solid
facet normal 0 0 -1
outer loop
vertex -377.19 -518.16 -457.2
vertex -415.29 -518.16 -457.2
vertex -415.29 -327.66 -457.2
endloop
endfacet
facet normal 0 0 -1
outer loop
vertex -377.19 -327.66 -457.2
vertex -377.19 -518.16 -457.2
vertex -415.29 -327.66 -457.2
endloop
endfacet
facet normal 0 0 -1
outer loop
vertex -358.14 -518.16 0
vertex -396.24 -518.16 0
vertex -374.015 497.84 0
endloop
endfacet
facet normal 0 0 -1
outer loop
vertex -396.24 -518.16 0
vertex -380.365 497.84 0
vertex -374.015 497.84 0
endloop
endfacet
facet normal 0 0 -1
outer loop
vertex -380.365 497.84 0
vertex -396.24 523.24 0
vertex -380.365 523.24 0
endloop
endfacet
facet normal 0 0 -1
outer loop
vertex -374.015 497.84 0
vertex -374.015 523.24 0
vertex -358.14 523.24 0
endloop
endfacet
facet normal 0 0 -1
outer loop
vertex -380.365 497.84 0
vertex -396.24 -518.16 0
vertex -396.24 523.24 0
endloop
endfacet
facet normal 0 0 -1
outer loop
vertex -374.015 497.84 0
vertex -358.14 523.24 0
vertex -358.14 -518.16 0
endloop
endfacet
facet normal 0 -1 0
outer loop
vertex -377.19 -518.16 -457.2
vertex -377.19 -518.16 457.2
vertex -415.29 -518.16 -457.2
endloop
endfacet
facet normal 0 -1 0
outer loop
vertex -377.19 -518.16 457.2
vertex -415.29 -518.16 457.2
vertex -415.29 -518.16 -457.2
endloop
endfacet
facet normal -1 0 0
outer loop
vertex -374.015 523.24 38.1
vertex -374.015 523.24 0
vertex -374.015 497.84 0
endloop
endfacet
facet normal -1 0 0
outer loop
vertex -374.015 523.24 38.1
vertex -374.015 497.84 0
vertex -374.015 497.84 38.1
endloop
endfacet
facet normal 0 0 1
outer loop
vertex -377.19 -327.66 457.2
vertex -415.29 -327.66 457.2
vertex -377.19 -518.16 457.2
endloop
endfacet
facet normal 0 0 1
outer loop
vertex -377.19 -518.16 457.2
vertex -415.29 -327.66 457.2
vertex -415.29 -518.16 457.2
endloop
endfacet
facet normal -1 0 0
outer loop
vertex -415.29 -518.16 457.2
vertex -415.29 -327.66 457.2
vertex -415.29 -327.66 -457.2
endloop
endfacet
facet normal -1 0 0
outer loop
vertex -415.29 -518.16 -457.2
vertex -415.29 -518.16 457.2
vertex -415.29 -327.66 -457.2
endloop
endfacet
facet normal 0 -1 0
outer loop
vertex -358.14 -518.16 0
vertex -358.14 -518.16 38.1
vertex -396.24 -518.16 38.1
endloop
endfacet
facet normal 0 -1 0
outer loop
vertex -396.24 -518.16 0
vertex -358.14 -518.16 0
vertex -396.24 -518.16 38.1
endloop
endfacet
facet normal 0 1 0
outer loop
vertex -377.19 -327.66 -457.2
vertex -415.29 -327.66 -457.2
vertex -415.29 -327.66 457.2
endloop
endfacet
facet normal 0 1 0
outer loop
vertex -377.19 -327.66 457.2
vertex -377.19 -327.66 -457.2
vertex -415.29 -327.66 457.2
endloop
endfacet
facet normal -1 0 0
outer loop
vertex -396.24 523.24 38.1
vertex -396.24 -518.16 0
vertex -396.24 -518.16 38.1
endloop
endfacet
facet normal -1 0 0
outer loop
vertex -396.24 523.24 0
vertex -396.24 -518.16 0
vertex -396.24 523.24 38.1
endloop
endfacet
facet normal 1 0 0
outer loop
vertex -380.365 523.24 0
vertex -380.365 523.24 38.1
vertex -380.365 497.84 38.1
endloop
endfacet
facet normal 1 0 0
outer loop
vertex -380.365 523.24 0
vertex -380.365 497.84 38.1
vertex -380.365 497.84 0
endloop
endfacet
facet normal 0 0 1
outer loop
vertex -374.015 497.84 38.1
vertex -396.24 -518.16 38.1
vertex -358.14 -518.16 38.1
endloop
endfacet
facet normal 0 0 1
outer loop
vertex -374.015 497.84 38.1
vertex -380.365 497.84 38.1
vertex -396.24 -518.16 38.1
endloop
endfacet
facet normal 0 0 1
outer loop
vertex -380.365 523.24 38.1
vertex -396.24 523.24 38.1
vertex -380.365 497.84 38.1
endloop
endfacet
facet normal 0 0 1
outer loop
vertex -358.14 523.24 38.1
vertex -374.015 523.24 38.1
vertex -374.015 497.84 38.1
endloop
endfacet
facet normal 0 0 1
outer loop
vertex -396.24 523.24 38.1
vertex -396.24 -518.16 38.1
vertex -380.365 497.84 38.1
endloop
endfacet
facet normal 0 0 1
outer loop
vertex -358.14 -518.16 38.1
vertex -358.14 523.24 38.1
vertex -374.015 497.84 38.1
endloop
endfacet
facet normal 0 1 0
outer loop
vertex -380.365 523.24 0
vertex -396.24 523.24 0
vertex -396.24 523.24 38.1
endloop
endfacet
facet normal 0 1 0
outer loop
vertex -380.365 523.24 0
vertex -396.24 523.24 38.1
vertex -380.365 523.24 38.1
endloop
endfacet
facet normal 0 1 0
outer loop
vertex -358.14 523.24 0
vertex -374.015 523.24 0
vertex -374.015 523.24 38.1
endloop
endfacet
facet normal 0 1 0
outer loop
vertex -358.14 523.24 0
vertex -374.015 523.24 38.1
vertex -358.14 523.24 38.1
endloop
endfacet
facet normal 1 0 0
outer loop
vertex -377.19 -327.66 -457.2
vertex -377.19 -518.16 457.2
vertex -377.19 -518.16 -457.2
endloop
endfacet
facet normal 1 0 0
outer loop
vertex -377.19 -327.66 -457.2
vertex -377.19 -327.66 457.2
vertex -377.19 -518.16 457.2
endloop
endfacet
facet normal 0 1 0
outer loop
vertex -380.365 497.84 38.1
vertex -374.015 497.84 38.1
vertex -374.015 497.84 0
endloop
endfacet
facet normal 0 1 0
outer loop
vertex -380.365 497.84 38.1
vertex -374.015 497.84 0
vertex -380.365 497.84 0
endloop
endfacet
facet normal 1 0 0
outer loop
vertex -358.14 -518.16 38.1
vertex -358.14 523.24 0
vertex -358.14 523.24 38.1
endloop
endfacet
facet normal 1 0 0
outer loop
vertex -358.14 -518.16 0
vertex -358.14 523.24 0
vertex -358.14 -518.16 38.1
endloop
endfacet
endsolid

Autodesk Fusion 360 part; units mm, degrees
sketch "Sketch1" plane through (0, 0, 0) normal (0, 0, 1) x (1, 0, 0)
  line L0 (0, 0) -> (914.4, 0)
  line L1 (914.4, 0) -> (914.4, 190.5)
  line L2 (914.4, 190.5) -> (0, 190.5)
  line L3 (0, 190.5) -> (0, 0)
  dimension "d1" = 914.4
  dimension "d2" = 190.5
extrude "Extrude1" add sketch "Sketch1" along normal blind 38.1 makes body 1
copy_body "Body->Comp1" bodies 1 removing the originals makes body 2 in component "Base"
sketch "Sketch2" plane through (0, 0, 0) normal (0, 0, 1) x (1, 0, 0)
  line L0 (-396.24, 523.24) -> (-358.14, 523.24)
  line L1 (-358.14, 523.24) -> (-358.14, -518.16)
  line L2 (-358.14, -518.16) -> (-396.24, -518.16)
  line L3 (-396.24, -518.16) -> (-396.24, 523.24)
  dimension "d5" = 38.1
  dimension "d6" = 1041.4
extrude "Extrude2" add sketch "Sketch2" along normal blind 38.1 separate body makes body 3
copy_body "Body->Comp2" bodies 3 removing the originals makes body 4 in component "Suport"
sketch "Sketch3" plane through (0, 523.24, 0) normal (0, 1, 0) x (-1, 0, 0)
  line L0 (358.14, 0) -> (396.24, 0)
  line L1 (396.24, 0) -> (396.24, 38.1)
  line L2 (396.24, 38.1) -> (358.14, 38.1)
  line L3 (358.14, 38.1) -> (358.14, 0)
  line L4 (374.015, 38.1) -> (380.365, 38.1)
  line L5 (380.365, 38.1) -> (380.365, 0)
  line L6 (380.365, 0) -> (374.015, 0)
  line L7 (374.015, 0) -> (374.015, 38.1)
  dimension "d13" = 6.35
extrude "Extrude1'" cut sketch "Sketch3" against normal blind 25.4 contours L0 L2 L4 L5 L6 L7 bodies 4 in component "Suport"
component "Base" placed x (0, 0, -1) y (0, 1, 0) z (1, 0, 0) at (-415.29, -518.16, 457.2)
component "Suport" placed x (1, 0, 0) y (0, 1, 0) z (0, 0, 1) at (0, 0, 0)
